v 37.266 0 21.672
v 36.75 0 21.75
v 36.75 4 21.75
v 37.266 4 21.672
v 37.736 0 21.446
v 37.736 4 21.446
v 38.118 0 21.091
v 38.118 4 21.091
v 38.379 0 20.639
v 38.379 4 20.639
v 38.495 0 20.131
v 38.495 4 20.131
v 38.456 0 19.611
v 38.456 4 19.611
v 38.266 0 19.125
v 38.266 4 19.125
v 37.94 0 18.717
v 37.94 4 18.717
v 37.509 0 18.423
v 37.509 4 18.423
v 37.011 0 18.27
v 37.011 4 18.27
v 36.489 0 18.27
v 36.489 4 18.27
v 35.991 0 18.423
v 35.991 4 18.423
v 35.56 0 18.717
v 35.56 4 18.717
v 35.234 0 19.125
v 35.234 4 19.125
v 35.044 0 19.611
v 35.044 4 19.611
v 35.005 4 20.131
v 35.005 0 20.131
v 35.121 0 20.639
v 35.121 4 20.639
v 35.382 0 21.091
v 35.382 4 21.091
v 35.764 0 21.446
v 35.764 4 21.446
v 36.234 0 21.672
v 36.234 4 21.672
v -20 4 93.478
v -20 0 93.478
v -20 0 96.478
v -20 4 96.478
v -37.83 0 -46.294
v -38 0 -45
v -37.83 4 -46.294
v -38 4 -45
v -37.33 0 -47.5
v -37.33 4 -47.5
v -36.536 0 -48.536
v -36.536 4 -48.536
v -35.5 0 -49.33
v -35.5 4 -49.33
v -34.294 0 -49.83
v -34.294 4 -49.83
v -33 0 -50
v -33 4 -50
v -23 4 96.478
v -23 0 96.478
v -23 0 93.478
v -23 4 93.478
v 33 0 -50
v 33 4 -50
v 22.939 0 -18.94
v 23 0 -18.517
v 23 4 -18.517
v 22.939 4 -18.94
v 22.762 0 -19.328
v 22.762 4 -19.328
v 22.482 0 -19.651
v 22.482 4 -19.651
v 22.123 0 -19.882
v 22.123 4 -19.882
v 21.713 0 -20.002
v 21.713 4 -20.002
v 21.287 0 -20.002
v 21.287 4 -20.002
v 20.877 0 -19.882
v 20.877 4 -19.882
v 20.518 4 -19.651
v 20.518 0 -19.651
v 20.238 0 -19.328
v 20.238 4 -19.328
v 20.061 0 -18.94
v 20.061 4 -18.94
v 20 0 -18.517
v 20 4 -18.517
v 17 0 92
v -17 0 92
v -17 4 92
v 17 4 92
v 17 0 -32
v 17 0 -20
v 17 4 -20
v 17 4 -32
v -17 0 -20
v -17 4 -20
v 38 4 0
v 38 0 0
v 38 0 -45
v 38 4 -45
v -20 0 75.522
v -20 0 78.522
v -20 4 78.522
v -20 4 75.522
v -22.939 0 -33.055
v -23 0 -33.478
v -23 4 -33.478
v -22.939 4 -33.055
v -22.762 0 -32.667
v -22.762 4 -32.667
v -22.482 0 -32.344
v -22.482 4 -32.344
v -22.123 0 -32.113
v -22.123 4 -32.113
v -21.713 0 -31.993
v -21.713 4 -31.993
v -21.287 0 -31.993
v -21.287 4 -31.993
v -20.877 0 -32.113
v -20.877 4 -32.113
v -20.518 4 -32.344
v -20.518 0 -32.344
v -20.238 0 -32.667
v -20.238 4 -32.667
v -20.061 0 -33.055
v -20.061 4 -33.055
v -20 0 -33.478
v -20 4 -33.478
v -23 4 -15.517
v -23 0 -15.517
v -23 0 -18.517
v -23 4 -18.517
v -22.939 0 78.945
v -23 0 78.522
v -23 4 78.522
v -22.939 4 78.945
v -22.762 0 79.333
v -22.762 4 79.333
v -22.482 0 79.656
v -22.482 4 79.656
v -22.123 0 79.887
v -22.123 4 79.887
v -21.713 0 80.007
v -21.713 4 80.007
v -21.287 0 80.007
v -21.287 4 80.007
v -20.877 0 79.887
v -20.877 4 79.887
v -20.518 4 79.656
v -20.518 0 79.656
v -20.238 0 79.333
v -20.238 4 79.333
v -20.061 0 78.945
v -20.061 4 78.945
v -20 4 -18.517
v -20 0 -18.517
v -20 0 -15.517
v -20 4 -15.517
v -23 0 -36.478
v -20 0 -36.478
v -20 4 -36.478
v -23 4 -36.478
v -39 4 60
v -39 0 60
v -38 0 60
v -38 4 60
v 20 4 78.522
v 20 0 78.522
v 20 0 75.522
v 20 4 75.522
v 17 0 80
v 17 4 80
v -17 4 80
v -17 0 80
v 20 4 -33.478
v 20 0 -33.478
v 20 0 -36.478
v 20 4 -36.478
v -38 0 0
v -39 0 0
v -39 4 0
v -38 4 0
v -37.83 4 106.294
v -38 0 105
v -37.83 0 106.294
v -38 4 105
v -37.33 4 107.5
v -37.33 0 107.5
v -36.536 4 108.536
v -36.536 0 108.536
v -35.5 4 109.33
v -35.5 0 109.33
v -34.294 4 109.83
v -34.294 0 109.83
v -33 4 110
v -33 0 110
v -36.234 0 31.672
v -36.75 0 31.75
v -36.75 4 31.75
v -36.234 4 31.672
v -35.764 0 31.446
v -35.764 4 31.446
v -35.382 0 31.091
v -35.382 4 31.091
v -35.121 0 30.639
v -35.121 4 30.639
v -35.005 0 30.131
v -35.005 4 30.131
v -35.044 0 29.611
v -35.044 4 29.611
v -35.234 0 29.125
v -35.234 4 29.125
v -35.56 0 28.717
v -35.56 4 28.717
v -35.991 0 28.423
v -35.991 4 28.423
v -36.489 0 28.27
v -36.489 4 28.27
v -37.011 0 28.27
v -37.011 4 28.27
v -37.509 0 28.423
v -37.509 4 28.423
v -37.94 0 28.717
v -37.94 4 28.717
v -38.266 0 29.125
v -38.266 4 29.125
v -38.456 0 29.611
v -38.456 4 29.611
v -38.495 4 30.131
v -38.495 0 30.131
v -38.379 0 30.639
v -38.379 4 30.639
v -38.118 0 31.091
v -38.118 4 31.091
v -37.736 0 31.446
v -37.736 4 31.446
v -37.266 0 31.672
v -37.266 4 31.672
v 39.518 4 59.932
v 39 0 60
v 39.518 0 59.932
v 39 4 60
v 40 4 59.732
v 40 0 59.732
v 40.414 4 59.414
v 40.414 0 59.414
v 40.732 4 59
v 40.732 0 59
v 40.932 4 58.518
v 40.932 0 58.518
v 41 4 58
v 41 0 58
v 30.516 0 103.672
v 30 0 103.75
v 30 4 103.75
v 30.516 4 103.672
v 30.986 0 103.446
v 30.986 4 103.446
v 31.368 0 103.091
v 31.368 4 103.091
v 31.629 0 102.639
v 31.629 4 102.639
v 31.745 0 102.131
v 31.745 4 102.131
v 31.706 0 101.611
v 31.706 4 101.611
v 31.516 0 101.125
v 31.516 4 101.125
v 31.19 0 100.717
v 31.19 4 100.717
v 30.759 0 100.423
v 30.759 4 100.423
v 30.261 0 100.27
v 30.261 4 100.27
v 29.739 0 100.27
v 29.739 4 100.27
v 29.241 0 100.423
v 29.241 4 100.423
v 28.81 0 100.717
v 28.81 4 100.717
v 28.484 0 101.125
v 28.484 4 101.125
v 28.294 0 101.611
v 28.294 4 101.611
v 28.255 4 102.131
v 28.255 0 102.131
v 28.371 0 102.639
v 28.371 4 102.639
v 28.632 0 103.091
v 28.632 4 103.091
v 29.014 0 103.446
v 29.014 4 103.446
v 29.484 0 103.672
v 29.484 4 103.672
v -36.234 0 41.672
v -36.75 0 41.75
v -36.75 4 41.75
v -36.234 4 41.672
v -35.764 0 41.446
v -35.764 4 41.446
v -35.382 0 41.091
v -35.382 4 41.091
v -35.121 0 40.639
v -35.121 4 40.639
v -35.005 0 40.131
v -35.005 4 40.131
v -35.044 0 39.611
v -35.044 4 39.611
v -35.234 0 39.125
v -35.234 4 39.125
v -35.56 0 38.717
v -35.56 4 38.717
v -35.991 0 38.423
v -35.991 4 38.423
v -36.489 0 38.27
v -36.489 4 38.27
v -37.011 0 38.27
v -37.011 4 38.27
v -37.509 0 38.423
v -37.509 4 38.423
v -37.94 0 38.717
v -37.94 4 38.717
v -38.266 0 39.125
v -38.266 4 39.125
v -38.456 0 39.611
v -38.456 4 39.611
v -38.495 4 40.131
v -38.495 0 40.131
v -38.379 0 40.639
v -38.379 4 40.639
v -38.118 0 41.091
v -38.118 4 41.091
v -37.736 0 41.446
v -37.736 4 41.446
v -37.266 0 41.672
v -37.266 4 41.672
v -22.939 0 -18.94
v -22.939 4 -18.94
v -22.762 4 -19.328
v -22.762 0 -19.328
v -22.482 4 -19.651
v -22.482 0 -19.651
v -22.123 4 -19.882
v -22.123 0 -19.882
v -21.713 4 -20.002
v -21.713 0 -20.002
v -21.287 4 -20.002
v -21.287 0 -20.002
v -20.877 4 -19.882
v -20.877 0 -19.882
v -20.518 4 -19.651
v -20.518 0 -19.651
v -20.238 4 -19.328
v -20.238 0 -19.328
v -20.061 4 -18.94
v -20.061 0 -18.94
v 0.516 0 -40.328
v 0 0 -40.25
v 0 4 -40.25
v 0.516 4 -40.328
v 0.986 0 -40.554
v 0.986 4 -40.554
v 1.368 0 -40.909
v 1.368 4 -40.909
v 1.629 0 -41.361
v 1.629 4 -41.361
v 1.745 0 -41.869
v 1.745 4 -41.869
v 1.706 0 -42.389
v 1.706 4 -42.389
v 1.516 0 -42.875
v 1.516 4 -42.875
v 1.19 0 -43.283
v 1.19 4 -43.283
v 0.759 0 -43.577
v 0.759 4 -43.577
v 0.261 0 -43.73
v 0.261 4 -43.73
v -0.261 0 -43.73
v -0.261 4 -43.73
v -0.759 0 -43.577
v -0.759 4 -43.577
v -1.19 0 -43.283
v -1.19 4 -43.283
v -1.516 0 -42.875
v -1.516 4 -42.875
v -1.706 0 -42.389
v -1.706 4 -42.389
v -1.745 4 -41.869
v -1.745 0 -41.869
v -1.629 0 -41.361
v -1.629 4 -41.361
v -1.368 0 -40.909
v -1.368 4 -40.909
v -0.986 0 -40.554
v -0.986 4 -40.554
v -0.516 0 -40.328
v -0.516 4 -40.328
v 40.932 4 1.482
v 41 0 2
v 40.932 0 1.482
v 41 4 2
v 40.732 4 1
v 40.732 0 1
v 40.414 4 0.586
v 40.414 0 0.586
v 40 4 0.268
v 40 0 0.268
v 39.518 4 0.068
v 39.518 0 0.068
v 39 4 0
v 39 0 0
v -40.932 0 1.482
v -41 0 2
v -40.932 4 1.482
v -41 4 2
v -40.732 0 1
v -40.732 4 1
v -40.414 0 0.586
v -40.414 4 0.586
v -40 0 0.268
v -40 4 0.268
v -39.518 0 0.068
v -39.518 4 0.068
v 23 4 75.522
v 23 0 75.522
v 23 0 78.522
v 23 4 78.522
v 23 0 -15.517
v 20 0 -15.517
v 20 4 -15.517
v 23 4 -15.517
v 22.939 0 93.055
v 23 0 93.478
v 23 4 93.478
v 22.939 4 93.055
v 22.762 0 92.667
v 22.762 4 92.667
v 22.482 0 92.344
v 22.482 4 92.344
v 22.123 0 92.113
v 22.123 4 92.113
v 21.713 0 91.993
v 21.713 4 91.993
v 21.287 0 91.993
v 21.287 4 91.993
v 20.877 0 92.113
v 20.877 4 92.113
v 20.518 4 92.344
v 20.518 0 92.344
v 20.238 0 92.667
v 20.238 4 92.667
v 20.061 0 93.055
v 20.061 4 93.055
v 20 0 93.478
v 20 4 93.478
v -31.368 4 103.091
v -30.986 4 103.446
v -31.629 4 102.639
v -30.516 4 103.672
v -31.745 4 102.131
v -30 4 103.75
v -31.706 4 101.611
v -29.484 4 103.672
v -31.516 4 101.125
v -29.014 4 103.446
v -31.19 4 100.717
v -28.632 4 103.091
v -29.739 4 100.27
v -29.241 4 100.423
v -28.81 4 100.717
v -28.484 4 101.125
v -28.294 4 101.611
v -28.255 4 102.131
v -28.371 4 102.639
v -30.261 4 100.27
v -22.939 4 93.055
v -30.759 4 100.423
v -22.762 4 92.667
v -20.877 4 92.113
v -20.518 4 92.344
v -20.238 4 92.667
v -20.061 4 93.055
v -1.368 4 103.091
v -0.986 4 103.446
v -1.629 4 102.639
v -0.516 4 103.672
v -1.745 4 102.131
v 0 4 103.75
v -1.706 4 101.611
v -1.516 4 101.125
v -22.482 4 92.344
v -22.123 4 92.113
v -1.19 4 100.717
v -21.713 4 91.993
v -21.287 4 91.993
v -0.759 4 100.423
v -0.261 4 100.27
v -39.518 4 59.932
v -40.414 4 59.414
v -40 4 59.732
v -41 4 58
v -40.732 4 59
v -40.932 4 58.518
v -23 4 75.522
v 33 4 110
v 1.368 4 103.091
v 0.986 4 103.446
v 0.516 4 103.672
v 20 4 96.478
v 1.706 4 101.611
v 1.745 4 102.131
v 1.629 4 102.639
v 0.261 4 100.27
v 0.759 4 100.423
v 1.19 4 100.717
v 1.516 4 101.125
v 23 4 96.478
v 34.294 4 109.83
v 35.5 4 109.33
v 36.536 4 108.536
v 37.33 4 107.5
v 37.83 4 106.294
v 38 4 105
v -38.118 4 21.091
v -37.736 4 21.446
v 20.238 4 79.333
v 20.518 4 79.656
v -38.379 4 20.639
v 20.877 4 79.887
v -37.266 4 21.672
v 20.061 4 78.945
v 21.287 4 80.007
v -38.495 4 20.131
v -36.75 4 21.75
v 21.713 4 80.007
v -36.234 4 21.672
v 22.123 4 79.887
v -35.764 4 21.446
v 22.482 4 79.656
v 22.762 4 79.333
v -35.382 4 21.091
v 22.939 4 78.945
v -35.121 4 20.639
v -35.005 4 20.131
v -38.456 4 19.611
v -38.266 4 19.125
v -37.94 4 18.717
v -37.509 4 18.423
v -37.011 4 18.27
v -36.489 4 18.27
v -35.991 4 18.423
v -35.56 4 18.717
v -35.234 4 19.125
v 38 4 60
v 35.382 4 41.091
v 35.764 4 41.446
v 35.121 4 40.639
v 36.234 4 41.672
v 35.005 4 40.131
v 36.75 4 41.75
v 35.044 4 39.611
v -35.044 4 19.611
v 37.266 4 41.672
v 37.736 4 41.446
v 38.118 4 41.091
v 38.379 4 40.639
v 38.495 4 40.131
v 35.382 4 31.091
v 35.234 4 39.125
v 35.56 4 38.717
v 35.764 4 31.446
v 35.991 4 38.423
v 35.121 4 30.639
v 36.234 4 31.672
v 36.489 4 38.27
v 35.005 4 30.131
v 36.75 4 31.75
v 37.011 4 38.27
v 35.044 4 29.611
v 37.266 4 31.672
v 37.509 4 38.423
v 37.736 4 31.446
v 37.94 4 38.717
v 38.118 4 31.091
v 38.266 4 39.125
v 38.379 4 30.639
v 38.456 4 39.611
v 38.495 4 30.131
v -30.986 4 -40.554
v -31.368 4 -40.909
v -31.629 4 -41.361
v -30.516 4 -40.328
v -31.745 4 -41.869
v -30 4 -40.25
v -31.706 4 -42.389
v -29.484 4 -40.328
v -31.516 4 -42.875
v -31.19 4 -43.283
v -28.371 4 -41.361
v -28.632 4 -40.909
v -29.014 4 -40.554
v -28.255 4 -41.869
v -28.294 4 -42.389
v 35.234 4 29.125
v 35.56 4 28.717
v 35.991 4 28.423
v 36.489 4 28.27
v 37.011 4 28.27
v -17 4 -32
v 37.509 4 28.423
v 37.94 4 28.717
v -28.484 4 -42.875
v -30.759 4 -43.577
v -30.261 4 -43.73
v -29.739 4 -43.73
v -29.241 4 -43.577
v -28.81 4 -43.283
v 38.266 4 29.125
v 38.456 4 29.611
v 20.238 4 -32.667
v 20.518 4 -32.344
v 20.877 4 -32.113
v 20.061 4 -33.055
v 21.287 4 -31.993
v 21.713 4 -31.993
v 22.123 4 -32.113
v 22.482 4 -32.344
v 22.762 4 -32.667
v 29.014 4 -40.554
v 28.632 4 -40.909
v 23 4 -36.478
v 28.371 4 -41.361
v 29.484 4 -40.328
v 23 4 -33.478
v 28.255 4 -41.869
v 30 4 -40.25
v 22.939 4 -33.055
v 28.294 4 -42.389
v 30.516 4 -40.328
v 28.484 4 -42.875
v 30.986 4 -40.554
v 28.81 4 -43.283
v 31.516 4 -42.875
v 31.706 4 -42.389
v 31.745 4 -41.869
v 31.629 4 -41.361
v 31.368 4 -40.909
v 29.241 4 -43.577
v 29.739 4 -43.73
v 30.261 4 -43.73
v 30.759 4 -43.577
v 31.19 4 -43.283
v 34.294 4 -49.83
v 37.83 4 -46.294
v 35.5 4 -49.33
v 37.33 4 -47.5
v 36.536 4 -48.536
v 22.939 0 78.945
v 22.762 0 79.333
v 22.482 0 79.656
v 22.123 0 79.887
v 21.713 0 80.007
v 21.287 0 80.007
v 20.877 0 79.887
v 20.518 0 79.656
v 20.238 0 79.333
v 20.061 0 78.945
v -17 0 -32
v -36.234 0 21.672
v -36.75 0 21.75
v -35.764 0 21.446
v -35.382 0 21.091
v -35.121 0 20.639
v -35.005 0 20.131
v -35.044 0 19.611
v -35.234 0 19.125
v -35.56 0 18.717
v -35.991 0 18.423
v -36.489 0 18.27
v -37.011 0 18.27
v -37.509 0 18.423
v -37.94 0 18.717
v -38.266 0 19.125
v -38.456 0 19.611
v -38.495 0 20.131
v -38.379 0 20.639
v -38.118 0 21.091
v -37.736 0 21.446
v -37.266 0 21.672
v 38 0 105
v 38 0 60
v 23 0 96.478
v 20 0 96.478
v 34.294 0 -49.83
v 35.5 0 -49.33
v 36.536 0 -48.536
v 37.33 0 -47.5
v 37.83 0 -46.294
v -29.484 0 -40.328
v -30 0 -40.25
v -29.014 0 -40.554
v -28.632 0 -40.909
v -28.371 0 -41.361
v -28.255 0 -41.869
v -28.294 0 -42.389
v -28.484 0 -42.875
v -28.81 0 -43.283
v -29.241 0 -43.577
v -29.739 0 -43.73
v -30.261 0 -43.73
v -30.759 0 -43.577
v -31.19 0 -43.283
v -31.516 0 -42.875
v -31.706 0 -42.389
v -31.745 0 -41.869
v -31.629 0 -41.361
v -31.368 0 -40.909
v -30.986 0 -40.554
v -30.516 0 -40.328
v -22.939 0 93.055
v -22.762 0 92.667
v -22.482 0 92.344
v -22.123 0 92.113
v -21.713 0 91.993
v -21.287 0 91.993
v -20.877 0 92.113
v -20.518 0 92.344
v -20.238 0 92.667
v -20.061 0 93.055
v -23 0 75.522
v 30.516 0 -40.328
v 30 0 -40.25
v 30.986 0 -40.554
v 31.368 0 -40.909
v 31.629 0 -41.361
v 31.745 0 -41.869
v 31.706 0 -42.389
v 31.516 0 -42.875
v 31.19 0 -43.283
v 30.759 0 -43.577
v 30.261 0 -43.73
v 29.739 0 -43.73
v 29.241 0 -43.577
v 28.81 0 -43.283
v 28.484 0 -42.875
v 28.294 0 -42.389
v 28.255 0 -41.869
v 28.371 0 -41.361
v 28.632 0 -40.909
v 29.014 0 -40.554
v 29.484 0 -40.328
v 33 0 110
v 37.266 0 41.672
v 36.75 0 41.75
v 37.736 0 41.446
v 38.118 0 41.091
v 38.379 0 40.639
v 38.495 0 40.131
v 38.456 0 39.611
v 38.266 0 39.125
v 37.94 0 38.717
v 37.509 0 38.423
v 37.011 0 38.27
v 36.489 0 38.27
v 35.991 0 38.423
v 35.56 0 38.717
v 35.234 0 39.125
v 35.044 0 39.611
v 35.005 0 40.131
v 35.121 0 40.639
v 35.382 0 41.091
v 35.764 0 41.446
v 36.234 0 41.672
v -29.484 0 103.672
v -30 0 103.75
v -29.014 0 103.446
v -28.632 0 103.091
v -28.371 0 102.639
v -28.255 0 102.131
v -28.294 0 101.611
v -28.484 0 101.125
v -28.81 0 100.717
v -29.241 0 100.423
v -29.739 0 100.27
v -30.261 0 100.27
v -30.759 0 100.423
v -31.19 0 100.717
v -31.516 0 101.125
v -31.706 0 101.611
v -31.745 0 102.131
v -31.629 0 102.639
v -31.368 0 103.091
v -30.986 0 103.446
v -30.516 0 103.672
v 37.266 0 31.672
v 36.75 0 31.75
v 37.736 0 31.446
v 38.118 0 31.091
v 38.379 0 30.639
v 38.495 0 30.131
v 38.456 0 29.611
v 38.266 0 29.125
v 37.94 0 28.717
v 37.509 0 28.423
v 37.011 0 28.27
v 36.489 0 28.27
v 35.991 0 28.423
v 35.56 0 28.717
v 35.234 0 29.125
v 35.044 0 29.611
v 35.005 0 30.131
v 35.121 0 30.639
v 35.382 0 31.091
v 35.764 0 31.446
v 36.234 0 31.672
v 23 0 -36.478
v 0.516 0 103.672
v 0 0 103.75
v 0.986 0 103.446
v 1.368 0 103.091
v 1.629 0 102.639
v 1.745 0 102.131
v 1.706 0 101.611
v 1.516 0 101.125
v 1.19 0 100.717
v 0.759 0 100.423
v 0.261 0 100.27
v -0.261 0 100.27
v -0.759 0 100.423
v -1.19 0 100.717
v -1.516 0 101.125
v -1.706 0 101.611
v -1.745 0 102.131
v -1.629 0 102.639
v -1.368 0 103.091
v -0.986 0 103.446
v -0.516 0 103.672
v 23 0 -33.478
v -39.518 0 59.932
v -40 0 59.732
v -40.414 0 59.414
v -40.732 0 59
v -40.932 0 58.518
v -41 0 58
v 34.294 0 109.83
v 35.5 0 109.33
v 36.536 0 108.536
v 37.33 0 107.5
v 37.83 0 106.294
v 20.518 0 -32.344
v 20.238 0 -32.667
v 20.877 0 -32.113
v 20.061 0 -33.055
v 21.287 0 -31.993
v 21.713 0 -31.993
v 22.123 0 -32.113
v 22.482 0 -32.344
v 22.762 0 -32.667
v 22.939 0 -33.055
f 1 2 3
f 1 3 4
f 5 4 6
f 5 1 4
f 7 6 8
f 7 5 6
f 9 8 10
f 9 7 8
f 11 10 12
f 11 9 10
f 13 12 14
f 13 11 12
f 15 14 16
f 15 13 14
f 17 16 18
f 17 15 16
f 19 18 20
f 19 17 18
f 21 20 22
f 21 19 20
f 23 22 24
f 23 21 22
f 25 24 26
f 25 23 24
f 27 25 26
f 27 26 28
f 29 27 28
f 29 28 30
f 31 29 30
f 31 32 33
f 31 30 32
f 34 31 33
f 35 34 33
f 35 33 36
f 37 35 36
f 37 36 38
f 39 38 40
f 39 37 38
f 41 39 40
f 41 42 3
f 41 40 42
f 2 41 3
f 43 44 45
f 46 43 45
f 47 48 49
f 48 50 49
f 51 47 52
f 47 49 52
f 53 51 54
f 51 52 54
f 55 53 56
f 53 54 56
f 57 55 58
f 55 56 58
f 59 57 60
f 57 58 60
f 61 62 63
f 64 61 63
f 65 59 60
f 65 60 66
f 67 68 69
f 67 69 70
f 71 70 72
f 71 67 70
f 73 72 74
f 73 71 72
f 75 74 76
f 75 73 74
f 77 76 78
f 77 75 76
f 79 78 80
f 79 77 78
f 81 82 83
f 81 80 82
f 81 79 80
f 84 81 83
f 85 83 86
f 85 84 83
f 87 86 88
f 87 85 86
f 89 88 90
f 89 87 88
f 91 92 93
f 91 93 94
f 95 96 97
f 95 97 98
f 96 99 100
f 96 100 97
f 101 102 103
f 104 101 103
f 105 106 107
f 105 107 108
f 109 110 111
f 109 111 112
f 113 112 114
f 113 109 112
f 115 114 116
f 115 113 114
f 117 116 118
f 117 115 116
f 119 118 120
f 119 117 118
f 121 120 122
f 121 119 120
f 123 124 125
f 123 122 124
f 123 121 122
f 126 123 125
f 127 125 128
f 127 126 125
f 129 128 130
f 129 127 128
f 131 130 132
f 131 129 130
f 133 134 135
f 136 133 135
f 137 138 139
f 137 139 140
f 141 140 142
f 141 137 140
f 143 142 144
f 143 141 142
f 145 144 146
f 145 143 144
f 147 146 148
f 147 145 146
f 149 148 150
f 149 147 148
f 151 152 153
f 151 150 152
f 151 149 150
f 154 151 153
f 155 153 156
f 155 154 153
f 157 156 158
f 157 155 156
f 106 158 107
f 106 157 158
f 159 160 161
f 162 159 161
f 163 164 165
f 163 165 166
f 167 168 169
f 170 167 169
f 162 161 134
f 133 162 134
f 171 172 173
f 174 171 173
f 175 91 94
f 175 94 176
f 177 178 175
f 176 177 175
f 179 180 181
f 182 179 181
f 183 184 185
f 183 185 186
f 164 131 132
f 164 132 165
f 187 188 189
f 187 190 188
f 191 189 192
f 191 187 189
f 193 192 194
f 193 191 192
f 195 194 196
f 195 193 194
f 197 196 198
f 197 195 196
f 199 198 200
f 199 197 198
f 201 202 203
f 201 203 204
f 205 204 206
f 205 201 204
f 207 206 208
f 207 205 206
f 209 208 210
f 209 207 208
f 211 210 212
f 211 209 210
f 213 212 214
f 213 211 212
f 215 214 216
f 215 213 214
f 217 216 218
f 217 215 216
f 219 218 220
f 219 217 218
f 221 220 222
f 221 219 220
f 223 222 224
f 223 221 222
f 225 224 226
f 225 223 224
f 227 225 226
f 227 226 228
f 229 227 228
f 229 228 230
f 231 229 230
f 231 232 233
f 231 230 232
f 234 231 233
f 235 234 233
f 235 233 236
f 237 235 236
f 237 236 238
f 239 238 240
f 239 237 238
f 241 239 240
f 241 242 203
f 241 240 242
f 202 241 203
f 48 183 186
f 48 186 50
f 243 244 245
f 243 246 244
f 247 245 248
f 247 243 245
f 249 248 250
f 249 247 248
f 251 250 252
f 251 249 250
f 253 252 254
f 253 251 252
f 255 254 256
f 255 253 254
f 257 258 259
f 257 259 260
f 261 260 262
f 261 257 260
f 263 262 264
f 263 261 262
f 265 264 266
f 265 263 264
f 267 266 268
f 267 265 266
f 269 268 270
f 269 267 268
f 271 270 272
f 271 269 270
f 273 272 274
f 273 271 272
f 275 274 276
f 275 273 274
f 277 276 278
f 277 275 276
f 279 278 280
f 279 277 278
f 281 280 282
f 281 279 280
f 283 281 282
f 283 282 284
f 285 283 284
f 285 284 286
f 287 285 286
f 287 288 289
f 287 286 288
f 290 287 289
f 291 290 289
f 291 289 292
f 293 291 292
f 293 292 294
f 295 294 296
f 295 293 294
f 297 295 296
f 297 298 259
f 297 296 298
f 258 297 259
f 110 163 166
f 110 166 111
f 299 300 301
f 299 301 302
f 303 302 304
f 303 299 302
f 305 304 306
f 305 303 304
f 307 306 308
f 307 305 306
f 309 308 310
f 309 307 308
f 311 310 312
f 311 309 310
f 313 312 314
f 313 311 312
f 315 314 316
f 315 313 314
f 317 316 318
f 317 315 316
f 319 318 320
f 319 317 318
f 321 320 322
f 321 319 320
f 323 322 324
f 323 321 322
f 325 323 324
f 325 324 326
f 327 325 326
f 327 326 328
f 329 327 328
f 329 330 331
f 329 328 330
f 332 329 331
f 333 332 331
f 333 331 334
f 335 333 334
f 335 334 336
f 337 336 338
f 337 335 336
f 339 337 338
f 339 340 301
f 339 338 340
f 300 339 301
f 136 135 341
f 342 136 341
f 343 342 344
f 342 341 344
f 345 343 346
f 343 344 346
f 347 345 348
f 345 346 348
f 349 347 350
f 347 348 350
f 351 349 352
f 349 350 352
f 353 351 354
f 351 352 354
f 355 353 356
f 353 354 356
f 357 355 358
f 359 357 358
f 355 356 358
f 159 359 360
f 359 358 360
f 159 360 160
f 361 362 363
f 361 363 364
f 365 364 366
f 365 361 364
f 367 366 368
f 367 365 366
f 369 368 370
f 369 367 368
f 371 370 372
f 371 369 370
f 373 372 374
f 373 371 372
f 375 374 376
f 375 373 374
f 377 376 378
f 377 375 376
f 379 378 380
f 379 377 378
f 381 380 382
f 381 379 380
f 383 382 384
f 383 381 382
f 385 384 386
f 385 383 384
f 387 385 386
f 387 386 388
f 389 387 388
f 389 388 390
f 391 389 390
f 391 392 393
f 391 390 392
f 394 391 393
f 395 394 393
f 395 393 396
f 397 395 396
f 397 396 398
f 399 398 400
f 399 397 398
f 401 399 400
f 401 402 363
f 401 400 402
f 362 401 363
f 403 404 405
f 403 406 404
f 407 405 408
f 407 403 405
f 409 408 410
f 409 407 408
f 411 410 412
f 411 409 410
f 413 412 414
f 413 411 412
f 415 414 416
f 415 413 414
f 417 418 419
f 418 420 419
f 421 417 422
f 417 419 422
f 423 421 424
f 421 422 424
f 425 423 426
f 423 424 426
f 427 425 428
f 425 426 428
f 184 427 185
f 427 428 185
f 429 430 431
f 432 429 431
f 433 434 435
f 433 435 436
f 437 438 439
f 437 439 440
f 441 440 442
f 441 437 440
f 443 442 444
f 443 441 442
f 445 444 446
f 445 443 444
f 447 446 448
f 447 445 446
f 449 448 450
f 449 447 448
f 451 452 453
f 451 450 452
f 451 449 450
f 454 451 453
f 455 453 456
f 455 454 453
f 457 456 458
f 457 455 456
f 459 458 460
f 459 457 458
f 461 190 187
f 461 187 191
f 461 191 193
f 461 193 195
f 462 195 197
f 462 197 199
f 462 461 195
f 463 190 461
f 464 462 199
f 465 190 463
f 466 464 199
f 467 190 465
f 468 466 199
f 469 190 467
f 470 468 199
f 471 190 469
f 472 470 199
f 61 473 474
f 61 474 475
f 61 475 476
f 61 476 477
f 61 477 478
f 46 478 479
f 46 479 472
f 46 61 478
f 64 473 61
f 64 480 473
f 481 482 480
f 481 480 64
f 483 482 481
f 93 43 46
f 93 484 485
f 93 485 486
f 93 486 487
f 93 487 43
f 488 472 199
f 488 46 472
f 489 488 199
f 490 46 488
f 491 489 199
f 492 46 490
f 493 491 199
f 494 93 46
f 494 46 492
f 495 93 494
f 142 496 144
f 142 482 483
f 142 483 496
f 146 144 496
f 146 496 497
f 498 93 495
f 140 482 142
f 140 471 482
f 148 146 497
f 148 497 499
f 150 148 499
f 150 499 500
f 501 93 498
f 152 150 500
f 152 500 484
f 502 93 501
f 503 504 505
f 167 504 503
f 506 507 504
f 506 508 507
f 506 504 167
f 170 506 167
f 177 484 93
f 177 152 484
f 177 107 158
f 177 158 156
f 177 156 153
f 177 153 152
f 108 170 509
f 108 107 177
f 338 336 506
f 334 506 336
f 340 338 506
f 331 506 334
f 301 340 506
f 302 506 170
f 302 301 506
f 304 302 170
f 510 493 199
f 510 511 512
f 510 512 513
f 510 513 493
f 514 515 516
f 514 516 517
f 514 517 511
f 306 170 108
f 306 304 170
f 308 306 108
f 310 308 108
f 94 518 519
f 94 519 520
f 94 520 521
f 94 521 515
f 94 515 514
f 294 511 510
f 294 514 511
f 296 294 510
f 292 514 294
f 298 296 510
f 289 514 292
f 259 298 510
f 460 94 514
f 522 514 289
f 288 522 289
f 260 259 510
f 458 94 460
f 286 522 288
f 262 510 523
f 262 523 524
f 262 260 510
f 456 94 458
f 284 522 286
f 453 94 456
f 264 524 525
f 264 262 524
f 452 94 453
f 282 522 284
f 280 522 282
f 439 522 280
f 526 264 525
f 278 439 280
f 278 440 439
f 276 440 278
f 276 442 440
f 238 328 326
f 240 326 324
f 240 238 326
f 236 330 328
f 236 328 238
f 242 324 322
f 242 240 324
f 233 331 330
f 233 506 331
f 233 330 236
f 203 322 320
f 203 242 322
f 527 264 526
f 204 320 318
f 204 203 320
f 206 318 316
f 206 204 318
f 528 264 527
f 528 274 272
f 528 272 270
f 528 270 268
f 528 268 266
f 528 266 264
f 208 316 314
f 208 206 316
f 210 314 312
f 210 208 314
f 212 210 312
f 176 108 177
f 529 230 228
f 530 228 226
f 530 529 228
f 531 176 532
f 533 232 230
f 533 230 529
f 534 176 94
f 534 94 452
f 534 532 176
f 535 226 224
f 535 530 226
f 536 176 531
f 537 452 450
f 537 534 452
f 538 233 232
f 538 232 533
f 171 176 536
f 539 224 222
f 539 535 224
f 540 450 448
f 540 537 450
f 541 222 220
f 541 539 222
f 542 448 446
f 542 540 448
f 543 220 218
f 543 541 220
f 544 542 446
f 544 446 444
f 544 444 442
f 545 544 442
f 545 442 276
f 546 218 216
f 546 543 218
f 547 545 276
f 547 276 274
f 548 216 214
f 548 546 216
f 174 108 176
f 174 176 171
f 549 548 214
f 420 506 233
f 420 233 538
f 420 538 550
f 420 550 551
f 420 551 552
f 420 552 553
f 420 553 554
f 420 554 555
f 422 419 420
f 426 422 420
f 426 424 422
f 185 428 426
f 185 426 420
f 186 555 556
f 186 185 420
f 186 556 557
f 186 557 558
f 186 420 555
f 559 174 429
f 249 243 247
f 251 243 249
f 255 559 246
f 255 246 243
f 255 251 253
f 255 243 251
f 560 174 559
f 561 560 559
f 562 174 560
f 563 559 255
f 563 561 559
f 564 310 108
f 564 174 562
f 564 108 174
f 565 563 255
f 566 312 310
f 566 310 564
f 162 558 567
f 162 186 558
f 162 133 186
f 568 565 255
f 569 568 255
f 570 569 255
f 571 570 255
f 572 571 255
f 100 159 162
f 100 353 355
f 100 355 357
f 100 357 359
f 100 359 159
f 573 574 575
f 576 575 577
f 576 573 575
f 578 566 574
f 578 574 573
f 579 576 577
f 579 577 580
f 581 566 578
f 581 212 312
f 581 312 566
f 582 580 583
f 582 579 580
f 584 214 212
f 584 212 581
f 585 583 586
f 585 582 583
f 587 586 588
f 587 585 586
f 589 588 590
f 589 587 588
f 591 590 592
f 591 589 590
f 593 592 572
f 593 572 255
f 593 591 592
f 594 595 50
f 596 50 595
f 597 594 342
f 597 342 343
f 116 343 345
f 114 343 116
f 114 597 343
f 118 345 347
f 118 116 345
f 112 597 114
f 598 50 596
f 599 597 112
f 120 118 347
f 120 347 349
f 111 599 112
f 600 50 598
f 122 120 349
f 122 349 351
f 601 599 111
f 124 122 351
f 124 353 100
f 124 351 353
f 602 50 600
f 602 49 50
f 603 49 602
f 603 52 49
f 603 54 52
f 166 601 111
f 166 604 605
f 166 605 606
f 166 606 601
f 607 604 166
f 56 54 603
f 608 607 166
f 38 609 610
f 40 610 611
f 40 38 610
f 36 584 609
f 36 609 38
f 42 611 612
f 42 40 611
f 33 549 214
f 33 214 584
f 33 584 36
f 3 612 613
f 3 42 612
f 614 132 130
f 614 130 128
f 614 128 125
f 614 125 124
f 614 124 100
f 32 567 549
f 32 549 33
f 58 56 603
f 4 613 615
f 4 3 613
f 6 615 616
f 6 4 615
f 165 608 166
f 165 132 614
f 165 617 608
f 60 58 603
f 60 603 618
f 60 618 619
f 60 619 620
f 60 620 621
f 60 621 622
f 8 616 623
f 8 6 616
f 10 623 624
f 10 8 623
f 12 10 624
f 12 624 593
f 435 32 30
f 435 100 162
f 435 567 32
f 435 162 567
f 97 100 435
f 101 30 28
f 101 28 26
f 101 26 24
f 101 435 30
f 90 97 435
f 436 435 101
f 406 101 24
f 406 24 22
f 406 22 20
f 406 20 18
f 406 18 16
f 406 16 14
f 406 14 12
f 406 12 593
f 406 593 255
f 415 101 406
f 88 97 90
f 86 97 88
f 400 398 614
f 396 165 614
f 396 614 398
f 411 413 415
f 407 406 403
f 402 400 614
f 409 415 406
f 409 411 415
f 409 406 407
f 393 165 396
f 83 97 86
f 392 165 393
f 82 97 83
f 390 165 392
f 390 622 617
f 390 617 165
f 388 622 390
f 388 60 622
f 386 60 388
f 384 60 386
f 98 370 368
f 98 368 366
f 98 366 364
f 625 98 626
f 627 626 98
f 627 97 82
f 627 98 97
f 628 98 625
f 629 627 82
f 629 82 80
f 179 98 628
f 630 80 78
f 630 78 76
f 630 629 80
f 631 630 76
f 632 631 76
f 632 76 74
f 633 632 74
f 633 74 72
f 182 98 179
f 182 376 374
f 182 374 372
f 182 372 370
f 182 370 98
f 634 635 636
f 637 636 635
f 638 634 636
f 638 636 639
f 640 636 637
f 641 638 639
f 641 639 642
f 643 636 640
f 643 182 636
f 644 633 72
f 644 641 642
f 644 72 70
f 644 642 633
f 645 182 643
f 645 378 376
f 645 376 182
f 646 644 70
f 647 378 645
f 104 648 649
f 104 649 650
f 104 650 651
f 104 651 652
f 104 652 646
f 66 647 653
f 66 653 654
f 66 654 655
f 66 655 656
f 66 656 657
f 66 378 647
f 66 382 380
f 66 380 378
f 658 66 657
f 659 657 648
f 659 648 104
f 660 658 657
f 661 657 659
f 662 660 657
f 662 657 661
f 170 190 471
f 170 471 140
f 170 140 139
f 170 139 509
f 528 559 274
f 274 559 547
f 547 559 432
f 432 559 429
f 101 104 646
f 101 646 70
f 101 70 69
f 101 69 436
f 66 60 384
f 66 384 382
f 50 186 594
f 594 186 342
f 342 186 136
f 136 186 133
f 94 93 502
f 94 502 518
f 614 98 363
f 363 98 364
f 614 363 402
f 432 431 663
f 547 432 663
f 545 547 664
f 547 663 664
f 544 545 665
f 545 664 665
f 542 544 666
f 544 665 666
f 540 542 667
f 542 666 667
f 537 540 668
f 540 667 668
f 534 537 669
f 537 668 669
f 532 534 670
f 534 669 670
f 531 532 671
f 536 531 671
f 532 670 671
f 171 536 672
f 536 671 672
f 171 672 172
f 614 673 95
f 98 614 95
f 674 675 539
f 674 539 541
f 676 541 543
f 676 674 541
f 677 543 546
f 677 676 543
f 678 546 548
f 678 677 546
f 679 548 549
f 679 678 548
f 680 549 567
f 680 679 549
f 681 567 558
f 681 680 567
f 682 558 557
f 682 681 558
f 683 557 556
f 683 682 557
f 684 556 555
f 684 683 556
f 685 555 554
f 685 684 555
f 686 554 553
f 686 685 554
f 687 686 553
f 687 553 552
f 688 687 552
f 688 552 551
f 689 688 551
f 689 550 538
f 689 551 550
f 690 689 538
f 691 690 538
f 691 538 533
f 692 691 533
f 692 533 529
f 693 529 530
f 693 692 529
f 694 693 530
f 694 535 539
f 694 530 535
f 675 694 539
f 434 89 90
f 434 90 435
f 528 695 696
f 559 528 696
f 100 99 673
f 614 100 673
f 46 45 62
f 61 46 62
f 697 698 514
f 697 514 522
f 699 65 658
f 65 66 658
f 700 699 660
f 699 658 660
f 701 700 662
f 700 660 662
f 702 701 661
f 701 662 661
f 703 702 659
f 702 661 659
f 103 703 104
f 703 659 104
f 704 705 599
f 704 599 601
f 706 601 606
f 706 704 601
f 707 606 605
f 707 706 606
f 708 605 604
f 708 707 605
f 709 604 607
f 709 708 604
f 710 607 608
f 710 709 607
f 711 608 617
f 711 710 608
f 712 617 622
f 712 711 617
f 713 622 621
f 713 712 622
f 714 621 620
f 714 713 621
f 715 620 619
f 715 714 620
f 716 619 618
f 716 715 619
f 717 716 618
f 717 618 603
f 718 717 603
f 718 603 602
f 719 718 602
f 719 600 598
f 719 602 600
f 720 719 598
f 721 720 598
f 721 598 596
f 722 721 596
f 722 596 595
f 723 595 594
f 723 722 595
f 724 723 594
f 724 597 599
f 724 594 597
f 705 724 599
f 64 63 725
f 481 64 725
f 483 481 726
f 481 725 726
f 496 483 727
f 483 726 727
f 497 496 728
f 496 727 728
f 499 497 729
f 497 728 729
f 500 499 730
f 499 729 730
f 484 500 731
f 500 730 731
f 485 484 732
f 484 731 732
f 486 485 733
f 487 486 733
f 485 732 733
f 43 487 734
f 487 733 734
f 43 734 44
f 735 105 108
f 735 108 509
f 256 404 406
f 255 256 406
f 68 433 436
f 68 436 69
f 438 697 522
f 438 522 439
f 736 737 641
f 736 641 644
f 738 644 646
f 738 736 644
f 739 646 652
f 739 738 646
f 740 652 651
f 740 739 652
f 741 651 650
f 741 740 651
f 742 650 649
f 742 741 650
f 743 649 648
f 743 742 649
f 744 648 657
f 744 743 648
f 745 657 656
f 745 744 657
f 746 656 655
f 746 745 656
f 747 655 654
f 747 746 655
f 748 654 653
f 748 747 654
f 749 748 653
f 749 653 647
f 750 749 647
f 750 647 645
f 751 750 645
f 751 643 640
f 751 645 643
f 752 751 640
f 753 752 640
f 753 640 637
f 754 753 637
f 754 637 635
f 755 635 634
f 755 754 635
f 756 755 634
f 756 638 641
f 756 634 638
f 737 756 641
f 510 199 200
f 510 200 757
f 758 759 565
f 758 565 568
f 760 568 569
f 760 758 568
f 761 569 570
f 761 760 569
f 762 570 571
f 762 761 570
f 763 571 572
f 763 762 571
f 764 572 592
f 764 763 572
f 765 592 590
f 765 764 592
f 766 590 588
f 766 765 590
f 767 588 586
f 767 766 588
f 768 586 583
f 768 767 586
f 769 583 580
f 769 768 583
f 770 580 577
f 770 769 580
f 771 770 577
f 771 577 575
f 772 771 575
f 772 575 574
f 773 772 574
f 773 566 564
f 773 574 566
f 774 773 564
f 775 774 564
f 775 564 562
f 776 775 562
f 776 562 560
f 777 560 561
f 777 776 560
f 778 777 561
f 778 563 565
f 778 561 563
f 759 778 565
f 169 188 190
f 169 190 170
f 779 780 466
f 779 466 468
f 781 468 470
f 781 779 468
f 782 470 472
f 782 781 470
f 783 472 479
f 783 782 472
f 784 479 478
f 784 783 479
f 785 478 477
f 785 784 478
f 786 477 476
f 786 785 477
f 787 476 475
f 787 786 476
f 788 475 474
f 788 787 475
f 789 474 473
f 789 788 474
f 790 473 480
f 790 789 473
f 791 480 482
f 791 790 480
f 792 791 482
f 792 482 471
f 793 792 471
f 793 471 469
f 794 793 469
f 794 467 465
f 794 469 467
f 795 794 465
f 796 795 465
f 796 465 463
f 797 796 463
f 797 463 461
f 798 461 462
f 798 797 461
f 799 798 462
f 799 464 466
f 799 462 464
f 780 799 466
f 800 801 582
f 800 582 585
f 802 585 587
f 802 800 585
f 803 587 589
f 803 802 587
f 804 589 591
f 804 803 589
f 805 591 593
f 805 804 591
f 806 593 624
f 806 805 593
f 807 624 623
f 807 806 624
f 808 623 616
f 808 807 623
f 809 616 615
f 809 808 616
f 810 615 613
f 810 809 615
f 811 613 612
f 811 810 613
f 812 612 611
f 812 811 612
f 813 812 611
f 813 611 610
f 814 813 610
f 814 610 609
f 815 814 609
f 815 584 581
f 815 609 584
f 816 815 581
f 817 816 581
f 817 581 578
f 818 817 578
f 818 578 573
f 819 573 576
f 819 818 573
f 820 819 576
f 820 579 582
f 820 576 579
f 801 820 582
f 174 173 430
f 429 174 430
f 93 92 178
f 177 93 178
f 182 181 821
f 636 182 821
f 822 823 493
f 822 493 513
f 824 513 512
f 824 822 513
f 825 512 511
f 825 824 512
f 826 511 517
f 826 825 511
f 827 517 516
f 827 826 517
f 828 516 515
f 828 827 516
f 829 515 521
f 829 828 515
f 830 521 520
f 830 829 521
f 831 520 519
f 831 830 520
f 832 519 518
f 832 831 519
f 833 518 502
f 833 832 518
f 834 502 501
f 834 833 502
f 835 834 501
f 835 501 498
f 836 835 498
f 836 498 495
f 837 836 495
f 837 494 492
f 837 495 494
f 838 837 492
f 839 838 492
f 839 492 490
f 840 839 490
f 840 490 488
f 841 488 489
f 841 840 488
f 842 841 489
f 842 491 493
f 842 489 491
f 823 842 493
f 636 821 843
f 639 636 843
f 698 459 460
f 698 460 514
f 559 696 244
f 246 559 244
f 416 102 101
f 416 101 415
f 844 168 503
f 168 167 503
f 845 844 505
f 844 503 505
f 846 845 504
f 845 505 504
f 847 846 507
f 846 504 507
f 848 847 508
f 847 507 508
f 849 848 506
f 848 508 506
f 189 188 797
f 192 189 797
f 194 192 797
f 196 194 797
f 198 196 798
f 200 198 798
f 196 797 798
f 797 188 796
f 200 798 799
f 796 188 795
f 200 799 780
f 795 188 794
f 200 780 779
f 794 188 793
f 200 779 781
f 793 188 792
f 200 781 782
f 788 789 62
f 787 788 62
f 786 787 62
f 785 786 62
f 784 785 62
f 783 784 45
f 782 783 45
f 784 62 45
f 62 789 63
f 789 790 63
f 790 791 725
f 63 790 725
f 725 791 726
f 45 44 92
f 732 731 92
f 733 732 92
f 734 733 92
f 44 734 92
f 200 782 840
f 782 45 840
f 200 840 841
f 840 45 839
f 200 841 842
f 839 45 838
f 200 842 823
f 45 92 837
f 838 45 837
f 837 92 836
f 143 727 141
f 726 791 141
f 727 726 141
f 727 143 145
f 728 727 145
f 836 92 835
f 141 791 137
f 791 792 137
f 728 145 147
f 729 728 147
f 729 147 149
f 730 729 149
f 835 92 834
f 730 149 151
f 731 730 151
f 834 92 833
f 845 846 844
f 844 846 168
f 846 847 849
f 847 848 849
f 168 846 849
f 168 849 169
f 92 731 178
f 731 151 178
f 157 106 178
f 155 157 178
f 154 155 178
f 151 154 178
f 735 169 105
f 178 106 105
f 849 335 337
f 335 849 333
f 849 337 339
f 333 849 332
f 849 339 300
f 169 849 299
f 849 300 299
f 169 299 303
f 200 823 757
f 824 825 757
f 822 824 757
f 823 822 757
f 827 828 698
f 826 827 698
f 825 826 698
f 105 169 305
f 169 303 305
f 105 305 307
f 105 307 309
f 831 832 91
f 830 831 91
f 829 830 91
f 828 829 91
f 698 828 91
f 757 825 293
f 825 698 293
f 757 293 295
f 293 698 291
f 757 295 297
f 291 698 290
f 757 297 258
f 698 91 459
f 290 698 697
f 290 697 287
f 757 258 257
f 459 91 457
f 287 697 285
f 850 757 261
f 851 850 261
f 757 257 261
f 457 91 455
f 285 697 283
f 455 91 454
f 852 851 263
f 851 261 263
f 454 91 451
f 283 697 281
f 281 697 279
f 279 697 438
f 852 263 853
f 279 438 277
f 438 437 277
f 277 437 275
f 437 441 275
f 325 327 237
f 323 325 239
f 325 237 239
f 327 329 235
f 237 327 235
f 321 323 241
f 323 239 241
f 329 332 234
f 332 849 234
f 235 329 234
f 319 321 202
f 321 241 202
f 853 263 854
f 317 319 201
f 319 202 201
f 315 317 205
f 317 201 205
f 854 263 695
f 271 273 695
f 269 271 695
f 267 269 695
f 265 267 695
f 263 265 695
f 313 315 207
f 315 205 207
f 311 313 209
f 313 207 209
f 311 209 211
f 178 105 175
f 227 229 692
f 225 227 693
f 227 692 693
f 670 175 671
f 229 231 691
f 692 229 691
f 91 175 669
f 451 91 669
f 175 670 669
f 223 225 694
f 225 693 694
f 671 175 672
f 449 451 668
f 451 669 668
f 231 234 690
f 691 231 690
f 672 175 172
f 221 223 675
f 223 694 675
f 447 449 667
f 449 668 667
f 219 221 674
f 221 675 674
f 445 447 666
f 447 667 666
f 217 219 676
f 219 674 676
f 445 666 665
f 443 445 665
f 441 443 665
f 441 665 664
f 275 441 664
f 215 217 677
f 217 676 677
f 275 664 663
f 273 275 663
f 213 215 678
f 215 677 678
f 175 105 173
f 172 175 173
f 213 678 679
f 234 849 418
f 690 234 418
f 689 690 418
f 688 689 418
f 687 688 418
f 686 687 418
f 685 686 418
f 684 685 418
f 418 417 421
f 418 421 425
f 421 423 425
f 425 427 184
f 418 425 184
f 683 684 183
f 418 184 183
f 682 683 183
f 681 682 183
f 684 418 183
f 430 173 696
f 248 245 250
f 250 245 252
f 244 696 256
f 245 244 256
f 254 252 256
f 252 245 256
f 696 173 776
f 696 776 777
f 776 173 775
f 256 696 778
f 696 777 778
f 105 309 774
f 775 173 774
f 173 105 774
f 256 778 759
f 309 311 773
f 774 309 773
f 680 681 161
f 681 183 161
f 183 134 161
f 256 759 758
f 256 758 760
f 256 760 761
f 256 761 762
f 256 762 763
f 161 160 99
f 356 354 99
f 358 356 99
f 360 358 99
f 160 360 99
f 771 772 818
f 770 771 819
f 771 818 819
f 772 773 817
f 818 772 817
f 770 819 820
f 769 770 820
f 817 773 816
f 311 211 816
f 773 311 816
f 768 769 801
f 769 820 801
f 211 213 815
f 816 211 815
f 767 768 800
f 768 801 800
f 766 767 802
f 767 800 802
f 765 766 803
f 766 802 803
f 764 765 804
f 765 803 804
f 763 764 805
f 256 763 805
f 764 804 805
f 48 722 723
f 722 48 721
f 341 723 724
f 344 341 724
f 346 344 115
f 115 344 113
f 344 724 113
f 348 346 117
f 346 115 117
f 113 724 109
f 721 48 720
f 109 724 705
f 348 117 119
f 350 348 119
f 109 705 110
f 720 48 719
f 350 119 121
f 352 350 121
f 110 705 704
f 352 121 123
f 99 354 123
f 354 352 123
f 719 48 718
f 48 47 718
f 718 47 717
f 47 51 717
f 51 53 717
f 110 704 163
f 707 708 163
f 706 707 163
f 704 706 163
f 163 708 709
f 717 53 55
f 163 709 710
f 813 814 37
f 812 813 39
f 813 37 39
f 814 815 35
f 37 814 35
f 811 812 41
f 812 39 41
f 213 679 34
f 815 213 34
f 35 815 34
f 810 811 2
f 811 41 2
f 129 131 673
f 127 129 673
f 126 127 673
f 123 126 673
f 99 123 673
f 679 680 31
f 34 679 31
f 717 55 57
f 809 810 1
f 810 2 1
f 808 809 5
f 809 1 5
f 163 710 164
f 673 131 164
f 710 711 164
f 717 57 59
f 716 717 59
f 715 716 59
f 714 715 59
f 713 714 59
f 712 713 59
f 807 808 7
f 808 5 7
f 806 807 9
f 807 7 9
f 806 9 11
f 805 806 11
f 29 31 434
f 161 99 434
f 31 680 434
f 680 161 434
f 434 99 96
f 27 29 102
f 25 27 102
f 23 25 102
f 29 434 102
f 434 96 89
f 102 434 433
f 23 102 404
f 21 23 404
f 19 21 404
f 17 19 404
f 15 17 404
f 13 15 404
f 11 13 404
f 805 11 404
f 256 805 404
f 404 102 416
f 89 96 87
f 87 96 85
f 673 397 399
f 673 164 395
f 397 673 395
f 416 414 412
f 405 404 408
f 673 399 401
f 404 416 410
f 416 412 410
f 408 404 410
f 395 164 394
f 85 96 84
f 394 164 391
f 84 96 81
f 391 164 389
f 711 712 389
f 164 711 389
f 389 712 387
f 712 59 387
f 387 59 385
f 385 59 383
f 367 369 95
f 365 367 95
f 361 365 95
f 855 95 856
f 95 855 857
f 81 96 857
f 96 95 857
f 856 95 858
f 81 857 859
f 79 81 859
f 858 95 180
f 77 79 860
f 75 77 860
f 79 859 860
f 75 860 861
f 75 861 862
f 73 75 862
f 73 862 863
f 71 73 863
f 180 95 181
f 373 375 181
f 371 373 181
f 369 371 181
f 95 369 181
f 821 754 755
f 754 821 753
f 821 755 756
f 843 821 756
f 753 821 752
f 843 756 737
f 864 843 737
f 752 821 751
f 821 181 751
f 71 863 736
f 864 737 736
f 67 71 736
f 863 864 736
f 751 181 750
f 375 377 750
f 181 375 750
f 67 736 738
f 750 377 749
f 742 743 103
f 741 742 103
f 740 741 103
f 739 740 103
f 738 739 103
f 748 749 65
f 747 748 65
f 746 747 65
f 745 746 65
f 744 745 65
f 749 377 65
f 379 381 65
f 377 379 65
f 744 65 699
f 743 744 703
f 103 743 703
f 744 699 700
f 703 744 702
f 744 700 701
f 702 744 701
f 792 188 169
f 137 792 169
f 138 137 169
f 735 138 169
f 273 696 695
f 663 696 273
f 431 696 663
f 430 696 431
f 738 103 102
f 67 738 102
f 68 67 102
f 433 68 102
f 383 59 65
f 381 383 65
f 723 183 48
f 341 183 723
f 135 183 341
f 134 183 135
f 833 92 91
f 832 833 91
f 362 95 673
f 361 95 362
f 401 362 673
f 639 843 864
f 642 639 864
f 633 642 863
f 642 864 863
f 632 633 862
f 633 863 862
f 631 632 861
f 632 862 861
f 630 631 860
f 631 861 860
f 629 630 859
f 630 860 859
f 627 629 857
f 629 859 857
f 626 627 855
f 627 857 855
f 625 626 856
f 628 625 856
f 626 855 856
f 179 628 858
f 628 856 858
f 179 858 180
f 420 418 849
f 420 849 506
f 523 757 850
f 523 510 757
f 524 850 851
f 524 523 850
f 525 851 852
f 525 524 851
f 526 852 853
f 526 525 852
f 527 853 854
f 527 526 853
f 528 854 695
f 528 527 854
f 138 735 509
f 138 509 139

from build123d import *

# Parameters (mm, degrees)
SKETCH_1_W               = 82
SKETCH_1_H               = 100
EXTRUDE_1_DEPTH          = 4
SKETCH_2_W               = 82
SKETCH_2_H               = 4
EXTRUDE_2_DEPTH          = 60
CUT_EXTRUDE_1_DEPTH      = 118.460631703
CUT_EXTRUDE_1_DEPTH_BACK = 118.460631703
SKETCH_3_W               = 3
SKETCH_3_H               = 50
CUT_EXTRUDE_2_DEPTH      = 118.460631703
CUT_EXTRUDE_2_DEPTH_BACK = 118.460631703
SKETCH_5_R               = 1.75
CUT_EXTRUDE_3_DEPTH      = 118.460631703
CUT_EXTRUDE_3_DEPTH_BACK = 118.460631703
SKETCH_6_R               = 1.75
CUT_EXTRUDE_4_DEPTH      = 118.460631703
CUT_EXTRUDE_4_DEPTH_BACK = 118.460631703
SKETCH_7_W               = 34
SKETCH_7_H               = 12
FILLET_1_R               = 5
FILLET_2_R               = 2
CUT_EXTRUDE_5_DEPTH      = 118.460631703
CUT_EXTRUDE_5_DEPTH_BACK = 118.460631703
SKETCH_8_R               = 1.75
CUT_EXTRUDE_6_DEPTH      = 118.460631703
CUT_EXTRUDE_6_DEPTH_BACK = 118.460631703
CUT_EXTRUDE_7_DEPTH      = 118.460631703
CUT_EXTRUDE_7_DEPTH_BACK = 118.460631703
SKETCH_10_R              = 1.75


with BuildPart() as part:
    # 草图1 → 凸台-拉伸1 (new body)
    with BuildSketch(Plane(origin=(0, 0, 0), x_dir=(1, 0, 0), z_dir=(0, 1, 0))):
        Rectangle(SKETCH_1_W, SKETCH_1_H)
    extrude(amount=EXTRUDE_1_DEPTH)

    # 草图2 → 凸台-拉伸2 (add)
    with BuildSketch(Plane.XY.offset(50)):
        with Locations((0, 2)):
            Rectangle(SKETCH_2_W, SKETCH_2_H)
    extrude(amount=EXTRUDE_2_DEPTH)

    # 草图3 → 切除-拉伸1 (cut, two sides: drawn at the far end of the back side and taken through both)
    with BuildSketch(Plane(origin=(0, 4, 0), x_dir=(1, 0, 0), z_dir=(0, 1, 0)).offset(-CUT_EXTRUDE_1_DEPTH_BACK)):
        with Locations((-39.5, 25)):
            Rectangle(SKETCH_3_W, SKETCH_3_H)
        with Locations((39.5, 25)):
            Rectangle(SKETCH_3_W, SKETCH_3_H)
        with Locations((-39.5, -85)):
            Rectangle(SKETCH_3_W, SKETCH_3_H)
        with Locations((39.5, -85)):
            Rectangle(SKETCH_3_W, SKETCH_3_H)
    extrude(amount=CUT_EXTRUDE_1_DEPTH + CUT_EXTRUDE_1_DEPTH_BACK, mode=Mode.SUBTRACT)

    # 草图5 → 切除-拉伸2 (cut, two sides: drawn at the far end of the back side and taken through both)
    with BuildSketch(Plane(origin=(0, 4, 0), x_dir=(1, 0, 0), z_dir=(0, 1, 0)).offset(-CUT_EXTRUDE_2_DEPTH_BACK)):
        with Locations(Location((-30, 42, 0), (0, 0, 270))):
            Circle(SKETCH_5_R)
    extrude(amount=CUT_EXTRUDE_2_DEPTH + CUT_EXTRUDE_2_DEPTH_BACK, mode=Mode.SUBTRACT)

    # 草图6 → 切除-拉伸3 (cut, two sides: drawn at the far end of the back side and taken through both)
    with BuildSketch(Plane(origin=(0, 4, 0), x_dir=(1, 0, 0), z_dir=(0, 1, 0)).offset(-CUT_EXTRUDE_3_DEPTH_BACK)):
        with Locations(Location((30, 42, 0), (0, 0, 270))):
            Circle(SKETCH_6_R)
        with Locations(Location((-30, -102, 0), (0, 0, 270))):
            Circle(SKETCH_6_R)
        with Locations(Location((30, -102, 0), (0, 0, 270))):
            Circle(SKETCH_6_R)
    extrude(amount=CUT_EXTRUDE_3_DEPTH + CUT_EXTRUDE_3_DEPTH_BACK, mode=Mode.SUBTRACT)

    # 草图7 → 切除-拉伸4 (cut, two sides: drawn at the far end of the back side and taken through both)
    with BuildSketch(Plane(origin=(0, 4, 0), x_dir=(1, 0, 0), z_dir=(0, 1, 0)).offset(-CUT_EXTRUDE_4_DEPTH_BACK)):
        with Locations((0, -86)):
            Rectangle(SKETCH_7_W, SKETCH_7_H)
        with Locations((0, 26)):
            Rectangle(SKETCH_7_W, SKETCH_7_H)
    extrude(amount=CUT_EXTRUDE_4_DEPTH + CUT_EXTRUDE_4_DEPTH_BACK, mode=Mode.SUBTRACT)

    # 圆角1
    fillet_1_edges = [part.edges().sort_by_distance(p)[0] for p in [
        (38, 2, -50),
        (-38, 2, 110),
        (38, 2, 110),
        (-38, 2, -50),
    ]]
    fillet(fillet_1_edges, radius=FILLET_1_R)

    # 圆角2
    fillet_2_edges = [part.edges().sort_by_distance(p)[0] for p in [
        (41, 2, 0),
        (-41, 2, 60),
        (41, 2, 60),
        (-41, 2, 0),
    ]]
    fillet(fillet_2_edges, radius=FILLET_2_R)

    # 草图8 → 切除-拉伸5 (cut, two sides: drawn at the far end of the back side and taken through both)
    with BuildSketch(Plane(origin=(0, 4, 0), x_dir=(1, 0, 0), z_dir=(0, 1, 0)).offset(-CUT_EXTRUDE_5_DEPTH_BACK)):
        with Locations(Location((0, 42, 0), (0, 0, 270))):
            Circle(SKETCH_8_R)
        with Locations(Location((0, -102, 0), (0, 0, 270))):
            Circle(SKETCH_8_R)
    extrude(amount=CUT_EXTRUDE_5_DEPTH + CUT_EXTRUDE_5_DEPTH_BACK, mode=Mode.SUBTRACT)

    # 草图9 → 切除-拉伸6 (cut, two sides: drawn at the far end of the back side and taken through both)
    with BuildSketch(Plane(origin=(0, 4, 0), x_dir=(1, 0, 0), z_dir=(0, 1, 0)).offset(-CUT_EXTRUDE_6_DEPTH_BACK)):
        with BuildLine():
            Line((20, 33.477548097), (20, 36.477548097))
            Line((20, 36.477548097), (23, 36.477548097))
            Line((23, 36.477548097), (23, 33.477548097))
            ThreePointArc((23, 33.477548097), (21.5, 31.977548097), (20, 33.477548097))
        make_face()
        with BuildLine():
            Line((-23, 36.477548097), (-23, 33.477548097))
            ThreePointArc((-23, 33.477548097), (-21.5, 31.977548097), (-20, 33.477548097))
            Line((-20, 33.477548097), (-20, 36.477548097))
            Line((-20, 36.477548097), (-23, 36.477548097))
        make_face()
        with BuildLine():
            Line((-20, -93.477548097), (-20, -96.477548097))
            Line((-20, -96.477548097), (-23, -96.477548097))
            Line((-23, -96.477548097), (-23, -93.477548097))
            ThreePointArc((-23, -93.477548097), (-21.5, -91.977548097), (-20, -93.477548097))
        make_face()
        with BuildLine():
            Line((23, -96.477548097), (23, -93.477548097))
            ThreePointArc((23, -93.477548097), (21.5, -91.977548097), (20, -93.477548097))
            Line((20, -93.477548097), (20, -96.477548097))
            Line((20, -96.477548097), (23, -96.477548097))
        make_face()
        with BuildLine():
            Line((-20, 18.517447437), (-20, 15.517447437))
            Line((-20, 15.517447437), (-23, 15.517447437))
            Line((-23, 15.517447437), (-23, 18.517447437))
            ThreePointArc((-23, 18.517447437), (-21.5, 20.017447437), (-20, 18.517447437))
        make_face()
        with BuildLine():
            Line((23, 15.517447437), (23, 18.517447437))
            ThreePointArc((23, 18.517447437), (21.5, 20.017447437), (20, 18.517447437))
            Line((20, 18.517447437), (20, 15.517447437))
            Line((20, 15.517447437), (23, 15.517447437))
        make_face()
        with BuildLine():
            Line((20, -78.522451903), (20, -75.522451903))
            Line((20, -75.522451903), (23, -75.522451903))
            Line((23, -75.522451903), (23, -78.522451903))
            ThreePointArc((23, -78.522451903), (21.5, -80.022451903), (20, -78.522451903))
        make_face()
        with BuildLine():
            Line((-23, -75.522451903), (-23, -78.522451903))
            ThreePointArc((-23, -78.522451903), (-21.5, -80.022451903), (-20, -78.522451903))
            Line((-20, -78.522451903), (-20, -75.522451903))
            Line((-20, -75.522451903), (-23, -75.522451903))
        make_face()
    extrude(amount=CUT_EXTRUDE_6_DEPTH + CUT_EXTRUDE_6_DEPTH_BACK, mode=Mode.SUBTRACT)

    # 草图10 → 切除-拉伸7 (cut, two sides: drawn at the far end of the back side and taken through both)
    with BuildSketch(Plane(origin=(0, 4, 0), x_dir=(1, 0, 0), z_dir=(0, 1, 0)).offset(-CUT_EXTRUDE_7_DEPTH_BACK)):
        with Locations(Location((-36.75, -30, 0), (0, 0, 270))):
            Circle(SKETCH_10_R)
        with Locations(Location((36.75, -30, 0), (0, 0, 270))):
            Circle(SKETCH_10_R)
        with Locations(Location((-36.75, -20, 0), (0, 0, 270))):
            Circle(SKETCH_10_R)
        with Locations(Location((36.75, -20, 0), (0, 0, 270))):
            Circle(SKETCH_10_R)
        with Locations(Location((-36.75, -40, 0), (0, 0, 270))):
            Circle(SKETCH_10_R)
        with Locations(Location((36.75, -40, 0), (0, 0, 270))):
            Circle(SKETCH_10_R)
    extrude(amount=CUT_EXTRUDE_7_DEPTH + CUT_EXTRUDE_7_DEPTH_BACK, mode=Mode.SUBTRACT)


solid = part.part
